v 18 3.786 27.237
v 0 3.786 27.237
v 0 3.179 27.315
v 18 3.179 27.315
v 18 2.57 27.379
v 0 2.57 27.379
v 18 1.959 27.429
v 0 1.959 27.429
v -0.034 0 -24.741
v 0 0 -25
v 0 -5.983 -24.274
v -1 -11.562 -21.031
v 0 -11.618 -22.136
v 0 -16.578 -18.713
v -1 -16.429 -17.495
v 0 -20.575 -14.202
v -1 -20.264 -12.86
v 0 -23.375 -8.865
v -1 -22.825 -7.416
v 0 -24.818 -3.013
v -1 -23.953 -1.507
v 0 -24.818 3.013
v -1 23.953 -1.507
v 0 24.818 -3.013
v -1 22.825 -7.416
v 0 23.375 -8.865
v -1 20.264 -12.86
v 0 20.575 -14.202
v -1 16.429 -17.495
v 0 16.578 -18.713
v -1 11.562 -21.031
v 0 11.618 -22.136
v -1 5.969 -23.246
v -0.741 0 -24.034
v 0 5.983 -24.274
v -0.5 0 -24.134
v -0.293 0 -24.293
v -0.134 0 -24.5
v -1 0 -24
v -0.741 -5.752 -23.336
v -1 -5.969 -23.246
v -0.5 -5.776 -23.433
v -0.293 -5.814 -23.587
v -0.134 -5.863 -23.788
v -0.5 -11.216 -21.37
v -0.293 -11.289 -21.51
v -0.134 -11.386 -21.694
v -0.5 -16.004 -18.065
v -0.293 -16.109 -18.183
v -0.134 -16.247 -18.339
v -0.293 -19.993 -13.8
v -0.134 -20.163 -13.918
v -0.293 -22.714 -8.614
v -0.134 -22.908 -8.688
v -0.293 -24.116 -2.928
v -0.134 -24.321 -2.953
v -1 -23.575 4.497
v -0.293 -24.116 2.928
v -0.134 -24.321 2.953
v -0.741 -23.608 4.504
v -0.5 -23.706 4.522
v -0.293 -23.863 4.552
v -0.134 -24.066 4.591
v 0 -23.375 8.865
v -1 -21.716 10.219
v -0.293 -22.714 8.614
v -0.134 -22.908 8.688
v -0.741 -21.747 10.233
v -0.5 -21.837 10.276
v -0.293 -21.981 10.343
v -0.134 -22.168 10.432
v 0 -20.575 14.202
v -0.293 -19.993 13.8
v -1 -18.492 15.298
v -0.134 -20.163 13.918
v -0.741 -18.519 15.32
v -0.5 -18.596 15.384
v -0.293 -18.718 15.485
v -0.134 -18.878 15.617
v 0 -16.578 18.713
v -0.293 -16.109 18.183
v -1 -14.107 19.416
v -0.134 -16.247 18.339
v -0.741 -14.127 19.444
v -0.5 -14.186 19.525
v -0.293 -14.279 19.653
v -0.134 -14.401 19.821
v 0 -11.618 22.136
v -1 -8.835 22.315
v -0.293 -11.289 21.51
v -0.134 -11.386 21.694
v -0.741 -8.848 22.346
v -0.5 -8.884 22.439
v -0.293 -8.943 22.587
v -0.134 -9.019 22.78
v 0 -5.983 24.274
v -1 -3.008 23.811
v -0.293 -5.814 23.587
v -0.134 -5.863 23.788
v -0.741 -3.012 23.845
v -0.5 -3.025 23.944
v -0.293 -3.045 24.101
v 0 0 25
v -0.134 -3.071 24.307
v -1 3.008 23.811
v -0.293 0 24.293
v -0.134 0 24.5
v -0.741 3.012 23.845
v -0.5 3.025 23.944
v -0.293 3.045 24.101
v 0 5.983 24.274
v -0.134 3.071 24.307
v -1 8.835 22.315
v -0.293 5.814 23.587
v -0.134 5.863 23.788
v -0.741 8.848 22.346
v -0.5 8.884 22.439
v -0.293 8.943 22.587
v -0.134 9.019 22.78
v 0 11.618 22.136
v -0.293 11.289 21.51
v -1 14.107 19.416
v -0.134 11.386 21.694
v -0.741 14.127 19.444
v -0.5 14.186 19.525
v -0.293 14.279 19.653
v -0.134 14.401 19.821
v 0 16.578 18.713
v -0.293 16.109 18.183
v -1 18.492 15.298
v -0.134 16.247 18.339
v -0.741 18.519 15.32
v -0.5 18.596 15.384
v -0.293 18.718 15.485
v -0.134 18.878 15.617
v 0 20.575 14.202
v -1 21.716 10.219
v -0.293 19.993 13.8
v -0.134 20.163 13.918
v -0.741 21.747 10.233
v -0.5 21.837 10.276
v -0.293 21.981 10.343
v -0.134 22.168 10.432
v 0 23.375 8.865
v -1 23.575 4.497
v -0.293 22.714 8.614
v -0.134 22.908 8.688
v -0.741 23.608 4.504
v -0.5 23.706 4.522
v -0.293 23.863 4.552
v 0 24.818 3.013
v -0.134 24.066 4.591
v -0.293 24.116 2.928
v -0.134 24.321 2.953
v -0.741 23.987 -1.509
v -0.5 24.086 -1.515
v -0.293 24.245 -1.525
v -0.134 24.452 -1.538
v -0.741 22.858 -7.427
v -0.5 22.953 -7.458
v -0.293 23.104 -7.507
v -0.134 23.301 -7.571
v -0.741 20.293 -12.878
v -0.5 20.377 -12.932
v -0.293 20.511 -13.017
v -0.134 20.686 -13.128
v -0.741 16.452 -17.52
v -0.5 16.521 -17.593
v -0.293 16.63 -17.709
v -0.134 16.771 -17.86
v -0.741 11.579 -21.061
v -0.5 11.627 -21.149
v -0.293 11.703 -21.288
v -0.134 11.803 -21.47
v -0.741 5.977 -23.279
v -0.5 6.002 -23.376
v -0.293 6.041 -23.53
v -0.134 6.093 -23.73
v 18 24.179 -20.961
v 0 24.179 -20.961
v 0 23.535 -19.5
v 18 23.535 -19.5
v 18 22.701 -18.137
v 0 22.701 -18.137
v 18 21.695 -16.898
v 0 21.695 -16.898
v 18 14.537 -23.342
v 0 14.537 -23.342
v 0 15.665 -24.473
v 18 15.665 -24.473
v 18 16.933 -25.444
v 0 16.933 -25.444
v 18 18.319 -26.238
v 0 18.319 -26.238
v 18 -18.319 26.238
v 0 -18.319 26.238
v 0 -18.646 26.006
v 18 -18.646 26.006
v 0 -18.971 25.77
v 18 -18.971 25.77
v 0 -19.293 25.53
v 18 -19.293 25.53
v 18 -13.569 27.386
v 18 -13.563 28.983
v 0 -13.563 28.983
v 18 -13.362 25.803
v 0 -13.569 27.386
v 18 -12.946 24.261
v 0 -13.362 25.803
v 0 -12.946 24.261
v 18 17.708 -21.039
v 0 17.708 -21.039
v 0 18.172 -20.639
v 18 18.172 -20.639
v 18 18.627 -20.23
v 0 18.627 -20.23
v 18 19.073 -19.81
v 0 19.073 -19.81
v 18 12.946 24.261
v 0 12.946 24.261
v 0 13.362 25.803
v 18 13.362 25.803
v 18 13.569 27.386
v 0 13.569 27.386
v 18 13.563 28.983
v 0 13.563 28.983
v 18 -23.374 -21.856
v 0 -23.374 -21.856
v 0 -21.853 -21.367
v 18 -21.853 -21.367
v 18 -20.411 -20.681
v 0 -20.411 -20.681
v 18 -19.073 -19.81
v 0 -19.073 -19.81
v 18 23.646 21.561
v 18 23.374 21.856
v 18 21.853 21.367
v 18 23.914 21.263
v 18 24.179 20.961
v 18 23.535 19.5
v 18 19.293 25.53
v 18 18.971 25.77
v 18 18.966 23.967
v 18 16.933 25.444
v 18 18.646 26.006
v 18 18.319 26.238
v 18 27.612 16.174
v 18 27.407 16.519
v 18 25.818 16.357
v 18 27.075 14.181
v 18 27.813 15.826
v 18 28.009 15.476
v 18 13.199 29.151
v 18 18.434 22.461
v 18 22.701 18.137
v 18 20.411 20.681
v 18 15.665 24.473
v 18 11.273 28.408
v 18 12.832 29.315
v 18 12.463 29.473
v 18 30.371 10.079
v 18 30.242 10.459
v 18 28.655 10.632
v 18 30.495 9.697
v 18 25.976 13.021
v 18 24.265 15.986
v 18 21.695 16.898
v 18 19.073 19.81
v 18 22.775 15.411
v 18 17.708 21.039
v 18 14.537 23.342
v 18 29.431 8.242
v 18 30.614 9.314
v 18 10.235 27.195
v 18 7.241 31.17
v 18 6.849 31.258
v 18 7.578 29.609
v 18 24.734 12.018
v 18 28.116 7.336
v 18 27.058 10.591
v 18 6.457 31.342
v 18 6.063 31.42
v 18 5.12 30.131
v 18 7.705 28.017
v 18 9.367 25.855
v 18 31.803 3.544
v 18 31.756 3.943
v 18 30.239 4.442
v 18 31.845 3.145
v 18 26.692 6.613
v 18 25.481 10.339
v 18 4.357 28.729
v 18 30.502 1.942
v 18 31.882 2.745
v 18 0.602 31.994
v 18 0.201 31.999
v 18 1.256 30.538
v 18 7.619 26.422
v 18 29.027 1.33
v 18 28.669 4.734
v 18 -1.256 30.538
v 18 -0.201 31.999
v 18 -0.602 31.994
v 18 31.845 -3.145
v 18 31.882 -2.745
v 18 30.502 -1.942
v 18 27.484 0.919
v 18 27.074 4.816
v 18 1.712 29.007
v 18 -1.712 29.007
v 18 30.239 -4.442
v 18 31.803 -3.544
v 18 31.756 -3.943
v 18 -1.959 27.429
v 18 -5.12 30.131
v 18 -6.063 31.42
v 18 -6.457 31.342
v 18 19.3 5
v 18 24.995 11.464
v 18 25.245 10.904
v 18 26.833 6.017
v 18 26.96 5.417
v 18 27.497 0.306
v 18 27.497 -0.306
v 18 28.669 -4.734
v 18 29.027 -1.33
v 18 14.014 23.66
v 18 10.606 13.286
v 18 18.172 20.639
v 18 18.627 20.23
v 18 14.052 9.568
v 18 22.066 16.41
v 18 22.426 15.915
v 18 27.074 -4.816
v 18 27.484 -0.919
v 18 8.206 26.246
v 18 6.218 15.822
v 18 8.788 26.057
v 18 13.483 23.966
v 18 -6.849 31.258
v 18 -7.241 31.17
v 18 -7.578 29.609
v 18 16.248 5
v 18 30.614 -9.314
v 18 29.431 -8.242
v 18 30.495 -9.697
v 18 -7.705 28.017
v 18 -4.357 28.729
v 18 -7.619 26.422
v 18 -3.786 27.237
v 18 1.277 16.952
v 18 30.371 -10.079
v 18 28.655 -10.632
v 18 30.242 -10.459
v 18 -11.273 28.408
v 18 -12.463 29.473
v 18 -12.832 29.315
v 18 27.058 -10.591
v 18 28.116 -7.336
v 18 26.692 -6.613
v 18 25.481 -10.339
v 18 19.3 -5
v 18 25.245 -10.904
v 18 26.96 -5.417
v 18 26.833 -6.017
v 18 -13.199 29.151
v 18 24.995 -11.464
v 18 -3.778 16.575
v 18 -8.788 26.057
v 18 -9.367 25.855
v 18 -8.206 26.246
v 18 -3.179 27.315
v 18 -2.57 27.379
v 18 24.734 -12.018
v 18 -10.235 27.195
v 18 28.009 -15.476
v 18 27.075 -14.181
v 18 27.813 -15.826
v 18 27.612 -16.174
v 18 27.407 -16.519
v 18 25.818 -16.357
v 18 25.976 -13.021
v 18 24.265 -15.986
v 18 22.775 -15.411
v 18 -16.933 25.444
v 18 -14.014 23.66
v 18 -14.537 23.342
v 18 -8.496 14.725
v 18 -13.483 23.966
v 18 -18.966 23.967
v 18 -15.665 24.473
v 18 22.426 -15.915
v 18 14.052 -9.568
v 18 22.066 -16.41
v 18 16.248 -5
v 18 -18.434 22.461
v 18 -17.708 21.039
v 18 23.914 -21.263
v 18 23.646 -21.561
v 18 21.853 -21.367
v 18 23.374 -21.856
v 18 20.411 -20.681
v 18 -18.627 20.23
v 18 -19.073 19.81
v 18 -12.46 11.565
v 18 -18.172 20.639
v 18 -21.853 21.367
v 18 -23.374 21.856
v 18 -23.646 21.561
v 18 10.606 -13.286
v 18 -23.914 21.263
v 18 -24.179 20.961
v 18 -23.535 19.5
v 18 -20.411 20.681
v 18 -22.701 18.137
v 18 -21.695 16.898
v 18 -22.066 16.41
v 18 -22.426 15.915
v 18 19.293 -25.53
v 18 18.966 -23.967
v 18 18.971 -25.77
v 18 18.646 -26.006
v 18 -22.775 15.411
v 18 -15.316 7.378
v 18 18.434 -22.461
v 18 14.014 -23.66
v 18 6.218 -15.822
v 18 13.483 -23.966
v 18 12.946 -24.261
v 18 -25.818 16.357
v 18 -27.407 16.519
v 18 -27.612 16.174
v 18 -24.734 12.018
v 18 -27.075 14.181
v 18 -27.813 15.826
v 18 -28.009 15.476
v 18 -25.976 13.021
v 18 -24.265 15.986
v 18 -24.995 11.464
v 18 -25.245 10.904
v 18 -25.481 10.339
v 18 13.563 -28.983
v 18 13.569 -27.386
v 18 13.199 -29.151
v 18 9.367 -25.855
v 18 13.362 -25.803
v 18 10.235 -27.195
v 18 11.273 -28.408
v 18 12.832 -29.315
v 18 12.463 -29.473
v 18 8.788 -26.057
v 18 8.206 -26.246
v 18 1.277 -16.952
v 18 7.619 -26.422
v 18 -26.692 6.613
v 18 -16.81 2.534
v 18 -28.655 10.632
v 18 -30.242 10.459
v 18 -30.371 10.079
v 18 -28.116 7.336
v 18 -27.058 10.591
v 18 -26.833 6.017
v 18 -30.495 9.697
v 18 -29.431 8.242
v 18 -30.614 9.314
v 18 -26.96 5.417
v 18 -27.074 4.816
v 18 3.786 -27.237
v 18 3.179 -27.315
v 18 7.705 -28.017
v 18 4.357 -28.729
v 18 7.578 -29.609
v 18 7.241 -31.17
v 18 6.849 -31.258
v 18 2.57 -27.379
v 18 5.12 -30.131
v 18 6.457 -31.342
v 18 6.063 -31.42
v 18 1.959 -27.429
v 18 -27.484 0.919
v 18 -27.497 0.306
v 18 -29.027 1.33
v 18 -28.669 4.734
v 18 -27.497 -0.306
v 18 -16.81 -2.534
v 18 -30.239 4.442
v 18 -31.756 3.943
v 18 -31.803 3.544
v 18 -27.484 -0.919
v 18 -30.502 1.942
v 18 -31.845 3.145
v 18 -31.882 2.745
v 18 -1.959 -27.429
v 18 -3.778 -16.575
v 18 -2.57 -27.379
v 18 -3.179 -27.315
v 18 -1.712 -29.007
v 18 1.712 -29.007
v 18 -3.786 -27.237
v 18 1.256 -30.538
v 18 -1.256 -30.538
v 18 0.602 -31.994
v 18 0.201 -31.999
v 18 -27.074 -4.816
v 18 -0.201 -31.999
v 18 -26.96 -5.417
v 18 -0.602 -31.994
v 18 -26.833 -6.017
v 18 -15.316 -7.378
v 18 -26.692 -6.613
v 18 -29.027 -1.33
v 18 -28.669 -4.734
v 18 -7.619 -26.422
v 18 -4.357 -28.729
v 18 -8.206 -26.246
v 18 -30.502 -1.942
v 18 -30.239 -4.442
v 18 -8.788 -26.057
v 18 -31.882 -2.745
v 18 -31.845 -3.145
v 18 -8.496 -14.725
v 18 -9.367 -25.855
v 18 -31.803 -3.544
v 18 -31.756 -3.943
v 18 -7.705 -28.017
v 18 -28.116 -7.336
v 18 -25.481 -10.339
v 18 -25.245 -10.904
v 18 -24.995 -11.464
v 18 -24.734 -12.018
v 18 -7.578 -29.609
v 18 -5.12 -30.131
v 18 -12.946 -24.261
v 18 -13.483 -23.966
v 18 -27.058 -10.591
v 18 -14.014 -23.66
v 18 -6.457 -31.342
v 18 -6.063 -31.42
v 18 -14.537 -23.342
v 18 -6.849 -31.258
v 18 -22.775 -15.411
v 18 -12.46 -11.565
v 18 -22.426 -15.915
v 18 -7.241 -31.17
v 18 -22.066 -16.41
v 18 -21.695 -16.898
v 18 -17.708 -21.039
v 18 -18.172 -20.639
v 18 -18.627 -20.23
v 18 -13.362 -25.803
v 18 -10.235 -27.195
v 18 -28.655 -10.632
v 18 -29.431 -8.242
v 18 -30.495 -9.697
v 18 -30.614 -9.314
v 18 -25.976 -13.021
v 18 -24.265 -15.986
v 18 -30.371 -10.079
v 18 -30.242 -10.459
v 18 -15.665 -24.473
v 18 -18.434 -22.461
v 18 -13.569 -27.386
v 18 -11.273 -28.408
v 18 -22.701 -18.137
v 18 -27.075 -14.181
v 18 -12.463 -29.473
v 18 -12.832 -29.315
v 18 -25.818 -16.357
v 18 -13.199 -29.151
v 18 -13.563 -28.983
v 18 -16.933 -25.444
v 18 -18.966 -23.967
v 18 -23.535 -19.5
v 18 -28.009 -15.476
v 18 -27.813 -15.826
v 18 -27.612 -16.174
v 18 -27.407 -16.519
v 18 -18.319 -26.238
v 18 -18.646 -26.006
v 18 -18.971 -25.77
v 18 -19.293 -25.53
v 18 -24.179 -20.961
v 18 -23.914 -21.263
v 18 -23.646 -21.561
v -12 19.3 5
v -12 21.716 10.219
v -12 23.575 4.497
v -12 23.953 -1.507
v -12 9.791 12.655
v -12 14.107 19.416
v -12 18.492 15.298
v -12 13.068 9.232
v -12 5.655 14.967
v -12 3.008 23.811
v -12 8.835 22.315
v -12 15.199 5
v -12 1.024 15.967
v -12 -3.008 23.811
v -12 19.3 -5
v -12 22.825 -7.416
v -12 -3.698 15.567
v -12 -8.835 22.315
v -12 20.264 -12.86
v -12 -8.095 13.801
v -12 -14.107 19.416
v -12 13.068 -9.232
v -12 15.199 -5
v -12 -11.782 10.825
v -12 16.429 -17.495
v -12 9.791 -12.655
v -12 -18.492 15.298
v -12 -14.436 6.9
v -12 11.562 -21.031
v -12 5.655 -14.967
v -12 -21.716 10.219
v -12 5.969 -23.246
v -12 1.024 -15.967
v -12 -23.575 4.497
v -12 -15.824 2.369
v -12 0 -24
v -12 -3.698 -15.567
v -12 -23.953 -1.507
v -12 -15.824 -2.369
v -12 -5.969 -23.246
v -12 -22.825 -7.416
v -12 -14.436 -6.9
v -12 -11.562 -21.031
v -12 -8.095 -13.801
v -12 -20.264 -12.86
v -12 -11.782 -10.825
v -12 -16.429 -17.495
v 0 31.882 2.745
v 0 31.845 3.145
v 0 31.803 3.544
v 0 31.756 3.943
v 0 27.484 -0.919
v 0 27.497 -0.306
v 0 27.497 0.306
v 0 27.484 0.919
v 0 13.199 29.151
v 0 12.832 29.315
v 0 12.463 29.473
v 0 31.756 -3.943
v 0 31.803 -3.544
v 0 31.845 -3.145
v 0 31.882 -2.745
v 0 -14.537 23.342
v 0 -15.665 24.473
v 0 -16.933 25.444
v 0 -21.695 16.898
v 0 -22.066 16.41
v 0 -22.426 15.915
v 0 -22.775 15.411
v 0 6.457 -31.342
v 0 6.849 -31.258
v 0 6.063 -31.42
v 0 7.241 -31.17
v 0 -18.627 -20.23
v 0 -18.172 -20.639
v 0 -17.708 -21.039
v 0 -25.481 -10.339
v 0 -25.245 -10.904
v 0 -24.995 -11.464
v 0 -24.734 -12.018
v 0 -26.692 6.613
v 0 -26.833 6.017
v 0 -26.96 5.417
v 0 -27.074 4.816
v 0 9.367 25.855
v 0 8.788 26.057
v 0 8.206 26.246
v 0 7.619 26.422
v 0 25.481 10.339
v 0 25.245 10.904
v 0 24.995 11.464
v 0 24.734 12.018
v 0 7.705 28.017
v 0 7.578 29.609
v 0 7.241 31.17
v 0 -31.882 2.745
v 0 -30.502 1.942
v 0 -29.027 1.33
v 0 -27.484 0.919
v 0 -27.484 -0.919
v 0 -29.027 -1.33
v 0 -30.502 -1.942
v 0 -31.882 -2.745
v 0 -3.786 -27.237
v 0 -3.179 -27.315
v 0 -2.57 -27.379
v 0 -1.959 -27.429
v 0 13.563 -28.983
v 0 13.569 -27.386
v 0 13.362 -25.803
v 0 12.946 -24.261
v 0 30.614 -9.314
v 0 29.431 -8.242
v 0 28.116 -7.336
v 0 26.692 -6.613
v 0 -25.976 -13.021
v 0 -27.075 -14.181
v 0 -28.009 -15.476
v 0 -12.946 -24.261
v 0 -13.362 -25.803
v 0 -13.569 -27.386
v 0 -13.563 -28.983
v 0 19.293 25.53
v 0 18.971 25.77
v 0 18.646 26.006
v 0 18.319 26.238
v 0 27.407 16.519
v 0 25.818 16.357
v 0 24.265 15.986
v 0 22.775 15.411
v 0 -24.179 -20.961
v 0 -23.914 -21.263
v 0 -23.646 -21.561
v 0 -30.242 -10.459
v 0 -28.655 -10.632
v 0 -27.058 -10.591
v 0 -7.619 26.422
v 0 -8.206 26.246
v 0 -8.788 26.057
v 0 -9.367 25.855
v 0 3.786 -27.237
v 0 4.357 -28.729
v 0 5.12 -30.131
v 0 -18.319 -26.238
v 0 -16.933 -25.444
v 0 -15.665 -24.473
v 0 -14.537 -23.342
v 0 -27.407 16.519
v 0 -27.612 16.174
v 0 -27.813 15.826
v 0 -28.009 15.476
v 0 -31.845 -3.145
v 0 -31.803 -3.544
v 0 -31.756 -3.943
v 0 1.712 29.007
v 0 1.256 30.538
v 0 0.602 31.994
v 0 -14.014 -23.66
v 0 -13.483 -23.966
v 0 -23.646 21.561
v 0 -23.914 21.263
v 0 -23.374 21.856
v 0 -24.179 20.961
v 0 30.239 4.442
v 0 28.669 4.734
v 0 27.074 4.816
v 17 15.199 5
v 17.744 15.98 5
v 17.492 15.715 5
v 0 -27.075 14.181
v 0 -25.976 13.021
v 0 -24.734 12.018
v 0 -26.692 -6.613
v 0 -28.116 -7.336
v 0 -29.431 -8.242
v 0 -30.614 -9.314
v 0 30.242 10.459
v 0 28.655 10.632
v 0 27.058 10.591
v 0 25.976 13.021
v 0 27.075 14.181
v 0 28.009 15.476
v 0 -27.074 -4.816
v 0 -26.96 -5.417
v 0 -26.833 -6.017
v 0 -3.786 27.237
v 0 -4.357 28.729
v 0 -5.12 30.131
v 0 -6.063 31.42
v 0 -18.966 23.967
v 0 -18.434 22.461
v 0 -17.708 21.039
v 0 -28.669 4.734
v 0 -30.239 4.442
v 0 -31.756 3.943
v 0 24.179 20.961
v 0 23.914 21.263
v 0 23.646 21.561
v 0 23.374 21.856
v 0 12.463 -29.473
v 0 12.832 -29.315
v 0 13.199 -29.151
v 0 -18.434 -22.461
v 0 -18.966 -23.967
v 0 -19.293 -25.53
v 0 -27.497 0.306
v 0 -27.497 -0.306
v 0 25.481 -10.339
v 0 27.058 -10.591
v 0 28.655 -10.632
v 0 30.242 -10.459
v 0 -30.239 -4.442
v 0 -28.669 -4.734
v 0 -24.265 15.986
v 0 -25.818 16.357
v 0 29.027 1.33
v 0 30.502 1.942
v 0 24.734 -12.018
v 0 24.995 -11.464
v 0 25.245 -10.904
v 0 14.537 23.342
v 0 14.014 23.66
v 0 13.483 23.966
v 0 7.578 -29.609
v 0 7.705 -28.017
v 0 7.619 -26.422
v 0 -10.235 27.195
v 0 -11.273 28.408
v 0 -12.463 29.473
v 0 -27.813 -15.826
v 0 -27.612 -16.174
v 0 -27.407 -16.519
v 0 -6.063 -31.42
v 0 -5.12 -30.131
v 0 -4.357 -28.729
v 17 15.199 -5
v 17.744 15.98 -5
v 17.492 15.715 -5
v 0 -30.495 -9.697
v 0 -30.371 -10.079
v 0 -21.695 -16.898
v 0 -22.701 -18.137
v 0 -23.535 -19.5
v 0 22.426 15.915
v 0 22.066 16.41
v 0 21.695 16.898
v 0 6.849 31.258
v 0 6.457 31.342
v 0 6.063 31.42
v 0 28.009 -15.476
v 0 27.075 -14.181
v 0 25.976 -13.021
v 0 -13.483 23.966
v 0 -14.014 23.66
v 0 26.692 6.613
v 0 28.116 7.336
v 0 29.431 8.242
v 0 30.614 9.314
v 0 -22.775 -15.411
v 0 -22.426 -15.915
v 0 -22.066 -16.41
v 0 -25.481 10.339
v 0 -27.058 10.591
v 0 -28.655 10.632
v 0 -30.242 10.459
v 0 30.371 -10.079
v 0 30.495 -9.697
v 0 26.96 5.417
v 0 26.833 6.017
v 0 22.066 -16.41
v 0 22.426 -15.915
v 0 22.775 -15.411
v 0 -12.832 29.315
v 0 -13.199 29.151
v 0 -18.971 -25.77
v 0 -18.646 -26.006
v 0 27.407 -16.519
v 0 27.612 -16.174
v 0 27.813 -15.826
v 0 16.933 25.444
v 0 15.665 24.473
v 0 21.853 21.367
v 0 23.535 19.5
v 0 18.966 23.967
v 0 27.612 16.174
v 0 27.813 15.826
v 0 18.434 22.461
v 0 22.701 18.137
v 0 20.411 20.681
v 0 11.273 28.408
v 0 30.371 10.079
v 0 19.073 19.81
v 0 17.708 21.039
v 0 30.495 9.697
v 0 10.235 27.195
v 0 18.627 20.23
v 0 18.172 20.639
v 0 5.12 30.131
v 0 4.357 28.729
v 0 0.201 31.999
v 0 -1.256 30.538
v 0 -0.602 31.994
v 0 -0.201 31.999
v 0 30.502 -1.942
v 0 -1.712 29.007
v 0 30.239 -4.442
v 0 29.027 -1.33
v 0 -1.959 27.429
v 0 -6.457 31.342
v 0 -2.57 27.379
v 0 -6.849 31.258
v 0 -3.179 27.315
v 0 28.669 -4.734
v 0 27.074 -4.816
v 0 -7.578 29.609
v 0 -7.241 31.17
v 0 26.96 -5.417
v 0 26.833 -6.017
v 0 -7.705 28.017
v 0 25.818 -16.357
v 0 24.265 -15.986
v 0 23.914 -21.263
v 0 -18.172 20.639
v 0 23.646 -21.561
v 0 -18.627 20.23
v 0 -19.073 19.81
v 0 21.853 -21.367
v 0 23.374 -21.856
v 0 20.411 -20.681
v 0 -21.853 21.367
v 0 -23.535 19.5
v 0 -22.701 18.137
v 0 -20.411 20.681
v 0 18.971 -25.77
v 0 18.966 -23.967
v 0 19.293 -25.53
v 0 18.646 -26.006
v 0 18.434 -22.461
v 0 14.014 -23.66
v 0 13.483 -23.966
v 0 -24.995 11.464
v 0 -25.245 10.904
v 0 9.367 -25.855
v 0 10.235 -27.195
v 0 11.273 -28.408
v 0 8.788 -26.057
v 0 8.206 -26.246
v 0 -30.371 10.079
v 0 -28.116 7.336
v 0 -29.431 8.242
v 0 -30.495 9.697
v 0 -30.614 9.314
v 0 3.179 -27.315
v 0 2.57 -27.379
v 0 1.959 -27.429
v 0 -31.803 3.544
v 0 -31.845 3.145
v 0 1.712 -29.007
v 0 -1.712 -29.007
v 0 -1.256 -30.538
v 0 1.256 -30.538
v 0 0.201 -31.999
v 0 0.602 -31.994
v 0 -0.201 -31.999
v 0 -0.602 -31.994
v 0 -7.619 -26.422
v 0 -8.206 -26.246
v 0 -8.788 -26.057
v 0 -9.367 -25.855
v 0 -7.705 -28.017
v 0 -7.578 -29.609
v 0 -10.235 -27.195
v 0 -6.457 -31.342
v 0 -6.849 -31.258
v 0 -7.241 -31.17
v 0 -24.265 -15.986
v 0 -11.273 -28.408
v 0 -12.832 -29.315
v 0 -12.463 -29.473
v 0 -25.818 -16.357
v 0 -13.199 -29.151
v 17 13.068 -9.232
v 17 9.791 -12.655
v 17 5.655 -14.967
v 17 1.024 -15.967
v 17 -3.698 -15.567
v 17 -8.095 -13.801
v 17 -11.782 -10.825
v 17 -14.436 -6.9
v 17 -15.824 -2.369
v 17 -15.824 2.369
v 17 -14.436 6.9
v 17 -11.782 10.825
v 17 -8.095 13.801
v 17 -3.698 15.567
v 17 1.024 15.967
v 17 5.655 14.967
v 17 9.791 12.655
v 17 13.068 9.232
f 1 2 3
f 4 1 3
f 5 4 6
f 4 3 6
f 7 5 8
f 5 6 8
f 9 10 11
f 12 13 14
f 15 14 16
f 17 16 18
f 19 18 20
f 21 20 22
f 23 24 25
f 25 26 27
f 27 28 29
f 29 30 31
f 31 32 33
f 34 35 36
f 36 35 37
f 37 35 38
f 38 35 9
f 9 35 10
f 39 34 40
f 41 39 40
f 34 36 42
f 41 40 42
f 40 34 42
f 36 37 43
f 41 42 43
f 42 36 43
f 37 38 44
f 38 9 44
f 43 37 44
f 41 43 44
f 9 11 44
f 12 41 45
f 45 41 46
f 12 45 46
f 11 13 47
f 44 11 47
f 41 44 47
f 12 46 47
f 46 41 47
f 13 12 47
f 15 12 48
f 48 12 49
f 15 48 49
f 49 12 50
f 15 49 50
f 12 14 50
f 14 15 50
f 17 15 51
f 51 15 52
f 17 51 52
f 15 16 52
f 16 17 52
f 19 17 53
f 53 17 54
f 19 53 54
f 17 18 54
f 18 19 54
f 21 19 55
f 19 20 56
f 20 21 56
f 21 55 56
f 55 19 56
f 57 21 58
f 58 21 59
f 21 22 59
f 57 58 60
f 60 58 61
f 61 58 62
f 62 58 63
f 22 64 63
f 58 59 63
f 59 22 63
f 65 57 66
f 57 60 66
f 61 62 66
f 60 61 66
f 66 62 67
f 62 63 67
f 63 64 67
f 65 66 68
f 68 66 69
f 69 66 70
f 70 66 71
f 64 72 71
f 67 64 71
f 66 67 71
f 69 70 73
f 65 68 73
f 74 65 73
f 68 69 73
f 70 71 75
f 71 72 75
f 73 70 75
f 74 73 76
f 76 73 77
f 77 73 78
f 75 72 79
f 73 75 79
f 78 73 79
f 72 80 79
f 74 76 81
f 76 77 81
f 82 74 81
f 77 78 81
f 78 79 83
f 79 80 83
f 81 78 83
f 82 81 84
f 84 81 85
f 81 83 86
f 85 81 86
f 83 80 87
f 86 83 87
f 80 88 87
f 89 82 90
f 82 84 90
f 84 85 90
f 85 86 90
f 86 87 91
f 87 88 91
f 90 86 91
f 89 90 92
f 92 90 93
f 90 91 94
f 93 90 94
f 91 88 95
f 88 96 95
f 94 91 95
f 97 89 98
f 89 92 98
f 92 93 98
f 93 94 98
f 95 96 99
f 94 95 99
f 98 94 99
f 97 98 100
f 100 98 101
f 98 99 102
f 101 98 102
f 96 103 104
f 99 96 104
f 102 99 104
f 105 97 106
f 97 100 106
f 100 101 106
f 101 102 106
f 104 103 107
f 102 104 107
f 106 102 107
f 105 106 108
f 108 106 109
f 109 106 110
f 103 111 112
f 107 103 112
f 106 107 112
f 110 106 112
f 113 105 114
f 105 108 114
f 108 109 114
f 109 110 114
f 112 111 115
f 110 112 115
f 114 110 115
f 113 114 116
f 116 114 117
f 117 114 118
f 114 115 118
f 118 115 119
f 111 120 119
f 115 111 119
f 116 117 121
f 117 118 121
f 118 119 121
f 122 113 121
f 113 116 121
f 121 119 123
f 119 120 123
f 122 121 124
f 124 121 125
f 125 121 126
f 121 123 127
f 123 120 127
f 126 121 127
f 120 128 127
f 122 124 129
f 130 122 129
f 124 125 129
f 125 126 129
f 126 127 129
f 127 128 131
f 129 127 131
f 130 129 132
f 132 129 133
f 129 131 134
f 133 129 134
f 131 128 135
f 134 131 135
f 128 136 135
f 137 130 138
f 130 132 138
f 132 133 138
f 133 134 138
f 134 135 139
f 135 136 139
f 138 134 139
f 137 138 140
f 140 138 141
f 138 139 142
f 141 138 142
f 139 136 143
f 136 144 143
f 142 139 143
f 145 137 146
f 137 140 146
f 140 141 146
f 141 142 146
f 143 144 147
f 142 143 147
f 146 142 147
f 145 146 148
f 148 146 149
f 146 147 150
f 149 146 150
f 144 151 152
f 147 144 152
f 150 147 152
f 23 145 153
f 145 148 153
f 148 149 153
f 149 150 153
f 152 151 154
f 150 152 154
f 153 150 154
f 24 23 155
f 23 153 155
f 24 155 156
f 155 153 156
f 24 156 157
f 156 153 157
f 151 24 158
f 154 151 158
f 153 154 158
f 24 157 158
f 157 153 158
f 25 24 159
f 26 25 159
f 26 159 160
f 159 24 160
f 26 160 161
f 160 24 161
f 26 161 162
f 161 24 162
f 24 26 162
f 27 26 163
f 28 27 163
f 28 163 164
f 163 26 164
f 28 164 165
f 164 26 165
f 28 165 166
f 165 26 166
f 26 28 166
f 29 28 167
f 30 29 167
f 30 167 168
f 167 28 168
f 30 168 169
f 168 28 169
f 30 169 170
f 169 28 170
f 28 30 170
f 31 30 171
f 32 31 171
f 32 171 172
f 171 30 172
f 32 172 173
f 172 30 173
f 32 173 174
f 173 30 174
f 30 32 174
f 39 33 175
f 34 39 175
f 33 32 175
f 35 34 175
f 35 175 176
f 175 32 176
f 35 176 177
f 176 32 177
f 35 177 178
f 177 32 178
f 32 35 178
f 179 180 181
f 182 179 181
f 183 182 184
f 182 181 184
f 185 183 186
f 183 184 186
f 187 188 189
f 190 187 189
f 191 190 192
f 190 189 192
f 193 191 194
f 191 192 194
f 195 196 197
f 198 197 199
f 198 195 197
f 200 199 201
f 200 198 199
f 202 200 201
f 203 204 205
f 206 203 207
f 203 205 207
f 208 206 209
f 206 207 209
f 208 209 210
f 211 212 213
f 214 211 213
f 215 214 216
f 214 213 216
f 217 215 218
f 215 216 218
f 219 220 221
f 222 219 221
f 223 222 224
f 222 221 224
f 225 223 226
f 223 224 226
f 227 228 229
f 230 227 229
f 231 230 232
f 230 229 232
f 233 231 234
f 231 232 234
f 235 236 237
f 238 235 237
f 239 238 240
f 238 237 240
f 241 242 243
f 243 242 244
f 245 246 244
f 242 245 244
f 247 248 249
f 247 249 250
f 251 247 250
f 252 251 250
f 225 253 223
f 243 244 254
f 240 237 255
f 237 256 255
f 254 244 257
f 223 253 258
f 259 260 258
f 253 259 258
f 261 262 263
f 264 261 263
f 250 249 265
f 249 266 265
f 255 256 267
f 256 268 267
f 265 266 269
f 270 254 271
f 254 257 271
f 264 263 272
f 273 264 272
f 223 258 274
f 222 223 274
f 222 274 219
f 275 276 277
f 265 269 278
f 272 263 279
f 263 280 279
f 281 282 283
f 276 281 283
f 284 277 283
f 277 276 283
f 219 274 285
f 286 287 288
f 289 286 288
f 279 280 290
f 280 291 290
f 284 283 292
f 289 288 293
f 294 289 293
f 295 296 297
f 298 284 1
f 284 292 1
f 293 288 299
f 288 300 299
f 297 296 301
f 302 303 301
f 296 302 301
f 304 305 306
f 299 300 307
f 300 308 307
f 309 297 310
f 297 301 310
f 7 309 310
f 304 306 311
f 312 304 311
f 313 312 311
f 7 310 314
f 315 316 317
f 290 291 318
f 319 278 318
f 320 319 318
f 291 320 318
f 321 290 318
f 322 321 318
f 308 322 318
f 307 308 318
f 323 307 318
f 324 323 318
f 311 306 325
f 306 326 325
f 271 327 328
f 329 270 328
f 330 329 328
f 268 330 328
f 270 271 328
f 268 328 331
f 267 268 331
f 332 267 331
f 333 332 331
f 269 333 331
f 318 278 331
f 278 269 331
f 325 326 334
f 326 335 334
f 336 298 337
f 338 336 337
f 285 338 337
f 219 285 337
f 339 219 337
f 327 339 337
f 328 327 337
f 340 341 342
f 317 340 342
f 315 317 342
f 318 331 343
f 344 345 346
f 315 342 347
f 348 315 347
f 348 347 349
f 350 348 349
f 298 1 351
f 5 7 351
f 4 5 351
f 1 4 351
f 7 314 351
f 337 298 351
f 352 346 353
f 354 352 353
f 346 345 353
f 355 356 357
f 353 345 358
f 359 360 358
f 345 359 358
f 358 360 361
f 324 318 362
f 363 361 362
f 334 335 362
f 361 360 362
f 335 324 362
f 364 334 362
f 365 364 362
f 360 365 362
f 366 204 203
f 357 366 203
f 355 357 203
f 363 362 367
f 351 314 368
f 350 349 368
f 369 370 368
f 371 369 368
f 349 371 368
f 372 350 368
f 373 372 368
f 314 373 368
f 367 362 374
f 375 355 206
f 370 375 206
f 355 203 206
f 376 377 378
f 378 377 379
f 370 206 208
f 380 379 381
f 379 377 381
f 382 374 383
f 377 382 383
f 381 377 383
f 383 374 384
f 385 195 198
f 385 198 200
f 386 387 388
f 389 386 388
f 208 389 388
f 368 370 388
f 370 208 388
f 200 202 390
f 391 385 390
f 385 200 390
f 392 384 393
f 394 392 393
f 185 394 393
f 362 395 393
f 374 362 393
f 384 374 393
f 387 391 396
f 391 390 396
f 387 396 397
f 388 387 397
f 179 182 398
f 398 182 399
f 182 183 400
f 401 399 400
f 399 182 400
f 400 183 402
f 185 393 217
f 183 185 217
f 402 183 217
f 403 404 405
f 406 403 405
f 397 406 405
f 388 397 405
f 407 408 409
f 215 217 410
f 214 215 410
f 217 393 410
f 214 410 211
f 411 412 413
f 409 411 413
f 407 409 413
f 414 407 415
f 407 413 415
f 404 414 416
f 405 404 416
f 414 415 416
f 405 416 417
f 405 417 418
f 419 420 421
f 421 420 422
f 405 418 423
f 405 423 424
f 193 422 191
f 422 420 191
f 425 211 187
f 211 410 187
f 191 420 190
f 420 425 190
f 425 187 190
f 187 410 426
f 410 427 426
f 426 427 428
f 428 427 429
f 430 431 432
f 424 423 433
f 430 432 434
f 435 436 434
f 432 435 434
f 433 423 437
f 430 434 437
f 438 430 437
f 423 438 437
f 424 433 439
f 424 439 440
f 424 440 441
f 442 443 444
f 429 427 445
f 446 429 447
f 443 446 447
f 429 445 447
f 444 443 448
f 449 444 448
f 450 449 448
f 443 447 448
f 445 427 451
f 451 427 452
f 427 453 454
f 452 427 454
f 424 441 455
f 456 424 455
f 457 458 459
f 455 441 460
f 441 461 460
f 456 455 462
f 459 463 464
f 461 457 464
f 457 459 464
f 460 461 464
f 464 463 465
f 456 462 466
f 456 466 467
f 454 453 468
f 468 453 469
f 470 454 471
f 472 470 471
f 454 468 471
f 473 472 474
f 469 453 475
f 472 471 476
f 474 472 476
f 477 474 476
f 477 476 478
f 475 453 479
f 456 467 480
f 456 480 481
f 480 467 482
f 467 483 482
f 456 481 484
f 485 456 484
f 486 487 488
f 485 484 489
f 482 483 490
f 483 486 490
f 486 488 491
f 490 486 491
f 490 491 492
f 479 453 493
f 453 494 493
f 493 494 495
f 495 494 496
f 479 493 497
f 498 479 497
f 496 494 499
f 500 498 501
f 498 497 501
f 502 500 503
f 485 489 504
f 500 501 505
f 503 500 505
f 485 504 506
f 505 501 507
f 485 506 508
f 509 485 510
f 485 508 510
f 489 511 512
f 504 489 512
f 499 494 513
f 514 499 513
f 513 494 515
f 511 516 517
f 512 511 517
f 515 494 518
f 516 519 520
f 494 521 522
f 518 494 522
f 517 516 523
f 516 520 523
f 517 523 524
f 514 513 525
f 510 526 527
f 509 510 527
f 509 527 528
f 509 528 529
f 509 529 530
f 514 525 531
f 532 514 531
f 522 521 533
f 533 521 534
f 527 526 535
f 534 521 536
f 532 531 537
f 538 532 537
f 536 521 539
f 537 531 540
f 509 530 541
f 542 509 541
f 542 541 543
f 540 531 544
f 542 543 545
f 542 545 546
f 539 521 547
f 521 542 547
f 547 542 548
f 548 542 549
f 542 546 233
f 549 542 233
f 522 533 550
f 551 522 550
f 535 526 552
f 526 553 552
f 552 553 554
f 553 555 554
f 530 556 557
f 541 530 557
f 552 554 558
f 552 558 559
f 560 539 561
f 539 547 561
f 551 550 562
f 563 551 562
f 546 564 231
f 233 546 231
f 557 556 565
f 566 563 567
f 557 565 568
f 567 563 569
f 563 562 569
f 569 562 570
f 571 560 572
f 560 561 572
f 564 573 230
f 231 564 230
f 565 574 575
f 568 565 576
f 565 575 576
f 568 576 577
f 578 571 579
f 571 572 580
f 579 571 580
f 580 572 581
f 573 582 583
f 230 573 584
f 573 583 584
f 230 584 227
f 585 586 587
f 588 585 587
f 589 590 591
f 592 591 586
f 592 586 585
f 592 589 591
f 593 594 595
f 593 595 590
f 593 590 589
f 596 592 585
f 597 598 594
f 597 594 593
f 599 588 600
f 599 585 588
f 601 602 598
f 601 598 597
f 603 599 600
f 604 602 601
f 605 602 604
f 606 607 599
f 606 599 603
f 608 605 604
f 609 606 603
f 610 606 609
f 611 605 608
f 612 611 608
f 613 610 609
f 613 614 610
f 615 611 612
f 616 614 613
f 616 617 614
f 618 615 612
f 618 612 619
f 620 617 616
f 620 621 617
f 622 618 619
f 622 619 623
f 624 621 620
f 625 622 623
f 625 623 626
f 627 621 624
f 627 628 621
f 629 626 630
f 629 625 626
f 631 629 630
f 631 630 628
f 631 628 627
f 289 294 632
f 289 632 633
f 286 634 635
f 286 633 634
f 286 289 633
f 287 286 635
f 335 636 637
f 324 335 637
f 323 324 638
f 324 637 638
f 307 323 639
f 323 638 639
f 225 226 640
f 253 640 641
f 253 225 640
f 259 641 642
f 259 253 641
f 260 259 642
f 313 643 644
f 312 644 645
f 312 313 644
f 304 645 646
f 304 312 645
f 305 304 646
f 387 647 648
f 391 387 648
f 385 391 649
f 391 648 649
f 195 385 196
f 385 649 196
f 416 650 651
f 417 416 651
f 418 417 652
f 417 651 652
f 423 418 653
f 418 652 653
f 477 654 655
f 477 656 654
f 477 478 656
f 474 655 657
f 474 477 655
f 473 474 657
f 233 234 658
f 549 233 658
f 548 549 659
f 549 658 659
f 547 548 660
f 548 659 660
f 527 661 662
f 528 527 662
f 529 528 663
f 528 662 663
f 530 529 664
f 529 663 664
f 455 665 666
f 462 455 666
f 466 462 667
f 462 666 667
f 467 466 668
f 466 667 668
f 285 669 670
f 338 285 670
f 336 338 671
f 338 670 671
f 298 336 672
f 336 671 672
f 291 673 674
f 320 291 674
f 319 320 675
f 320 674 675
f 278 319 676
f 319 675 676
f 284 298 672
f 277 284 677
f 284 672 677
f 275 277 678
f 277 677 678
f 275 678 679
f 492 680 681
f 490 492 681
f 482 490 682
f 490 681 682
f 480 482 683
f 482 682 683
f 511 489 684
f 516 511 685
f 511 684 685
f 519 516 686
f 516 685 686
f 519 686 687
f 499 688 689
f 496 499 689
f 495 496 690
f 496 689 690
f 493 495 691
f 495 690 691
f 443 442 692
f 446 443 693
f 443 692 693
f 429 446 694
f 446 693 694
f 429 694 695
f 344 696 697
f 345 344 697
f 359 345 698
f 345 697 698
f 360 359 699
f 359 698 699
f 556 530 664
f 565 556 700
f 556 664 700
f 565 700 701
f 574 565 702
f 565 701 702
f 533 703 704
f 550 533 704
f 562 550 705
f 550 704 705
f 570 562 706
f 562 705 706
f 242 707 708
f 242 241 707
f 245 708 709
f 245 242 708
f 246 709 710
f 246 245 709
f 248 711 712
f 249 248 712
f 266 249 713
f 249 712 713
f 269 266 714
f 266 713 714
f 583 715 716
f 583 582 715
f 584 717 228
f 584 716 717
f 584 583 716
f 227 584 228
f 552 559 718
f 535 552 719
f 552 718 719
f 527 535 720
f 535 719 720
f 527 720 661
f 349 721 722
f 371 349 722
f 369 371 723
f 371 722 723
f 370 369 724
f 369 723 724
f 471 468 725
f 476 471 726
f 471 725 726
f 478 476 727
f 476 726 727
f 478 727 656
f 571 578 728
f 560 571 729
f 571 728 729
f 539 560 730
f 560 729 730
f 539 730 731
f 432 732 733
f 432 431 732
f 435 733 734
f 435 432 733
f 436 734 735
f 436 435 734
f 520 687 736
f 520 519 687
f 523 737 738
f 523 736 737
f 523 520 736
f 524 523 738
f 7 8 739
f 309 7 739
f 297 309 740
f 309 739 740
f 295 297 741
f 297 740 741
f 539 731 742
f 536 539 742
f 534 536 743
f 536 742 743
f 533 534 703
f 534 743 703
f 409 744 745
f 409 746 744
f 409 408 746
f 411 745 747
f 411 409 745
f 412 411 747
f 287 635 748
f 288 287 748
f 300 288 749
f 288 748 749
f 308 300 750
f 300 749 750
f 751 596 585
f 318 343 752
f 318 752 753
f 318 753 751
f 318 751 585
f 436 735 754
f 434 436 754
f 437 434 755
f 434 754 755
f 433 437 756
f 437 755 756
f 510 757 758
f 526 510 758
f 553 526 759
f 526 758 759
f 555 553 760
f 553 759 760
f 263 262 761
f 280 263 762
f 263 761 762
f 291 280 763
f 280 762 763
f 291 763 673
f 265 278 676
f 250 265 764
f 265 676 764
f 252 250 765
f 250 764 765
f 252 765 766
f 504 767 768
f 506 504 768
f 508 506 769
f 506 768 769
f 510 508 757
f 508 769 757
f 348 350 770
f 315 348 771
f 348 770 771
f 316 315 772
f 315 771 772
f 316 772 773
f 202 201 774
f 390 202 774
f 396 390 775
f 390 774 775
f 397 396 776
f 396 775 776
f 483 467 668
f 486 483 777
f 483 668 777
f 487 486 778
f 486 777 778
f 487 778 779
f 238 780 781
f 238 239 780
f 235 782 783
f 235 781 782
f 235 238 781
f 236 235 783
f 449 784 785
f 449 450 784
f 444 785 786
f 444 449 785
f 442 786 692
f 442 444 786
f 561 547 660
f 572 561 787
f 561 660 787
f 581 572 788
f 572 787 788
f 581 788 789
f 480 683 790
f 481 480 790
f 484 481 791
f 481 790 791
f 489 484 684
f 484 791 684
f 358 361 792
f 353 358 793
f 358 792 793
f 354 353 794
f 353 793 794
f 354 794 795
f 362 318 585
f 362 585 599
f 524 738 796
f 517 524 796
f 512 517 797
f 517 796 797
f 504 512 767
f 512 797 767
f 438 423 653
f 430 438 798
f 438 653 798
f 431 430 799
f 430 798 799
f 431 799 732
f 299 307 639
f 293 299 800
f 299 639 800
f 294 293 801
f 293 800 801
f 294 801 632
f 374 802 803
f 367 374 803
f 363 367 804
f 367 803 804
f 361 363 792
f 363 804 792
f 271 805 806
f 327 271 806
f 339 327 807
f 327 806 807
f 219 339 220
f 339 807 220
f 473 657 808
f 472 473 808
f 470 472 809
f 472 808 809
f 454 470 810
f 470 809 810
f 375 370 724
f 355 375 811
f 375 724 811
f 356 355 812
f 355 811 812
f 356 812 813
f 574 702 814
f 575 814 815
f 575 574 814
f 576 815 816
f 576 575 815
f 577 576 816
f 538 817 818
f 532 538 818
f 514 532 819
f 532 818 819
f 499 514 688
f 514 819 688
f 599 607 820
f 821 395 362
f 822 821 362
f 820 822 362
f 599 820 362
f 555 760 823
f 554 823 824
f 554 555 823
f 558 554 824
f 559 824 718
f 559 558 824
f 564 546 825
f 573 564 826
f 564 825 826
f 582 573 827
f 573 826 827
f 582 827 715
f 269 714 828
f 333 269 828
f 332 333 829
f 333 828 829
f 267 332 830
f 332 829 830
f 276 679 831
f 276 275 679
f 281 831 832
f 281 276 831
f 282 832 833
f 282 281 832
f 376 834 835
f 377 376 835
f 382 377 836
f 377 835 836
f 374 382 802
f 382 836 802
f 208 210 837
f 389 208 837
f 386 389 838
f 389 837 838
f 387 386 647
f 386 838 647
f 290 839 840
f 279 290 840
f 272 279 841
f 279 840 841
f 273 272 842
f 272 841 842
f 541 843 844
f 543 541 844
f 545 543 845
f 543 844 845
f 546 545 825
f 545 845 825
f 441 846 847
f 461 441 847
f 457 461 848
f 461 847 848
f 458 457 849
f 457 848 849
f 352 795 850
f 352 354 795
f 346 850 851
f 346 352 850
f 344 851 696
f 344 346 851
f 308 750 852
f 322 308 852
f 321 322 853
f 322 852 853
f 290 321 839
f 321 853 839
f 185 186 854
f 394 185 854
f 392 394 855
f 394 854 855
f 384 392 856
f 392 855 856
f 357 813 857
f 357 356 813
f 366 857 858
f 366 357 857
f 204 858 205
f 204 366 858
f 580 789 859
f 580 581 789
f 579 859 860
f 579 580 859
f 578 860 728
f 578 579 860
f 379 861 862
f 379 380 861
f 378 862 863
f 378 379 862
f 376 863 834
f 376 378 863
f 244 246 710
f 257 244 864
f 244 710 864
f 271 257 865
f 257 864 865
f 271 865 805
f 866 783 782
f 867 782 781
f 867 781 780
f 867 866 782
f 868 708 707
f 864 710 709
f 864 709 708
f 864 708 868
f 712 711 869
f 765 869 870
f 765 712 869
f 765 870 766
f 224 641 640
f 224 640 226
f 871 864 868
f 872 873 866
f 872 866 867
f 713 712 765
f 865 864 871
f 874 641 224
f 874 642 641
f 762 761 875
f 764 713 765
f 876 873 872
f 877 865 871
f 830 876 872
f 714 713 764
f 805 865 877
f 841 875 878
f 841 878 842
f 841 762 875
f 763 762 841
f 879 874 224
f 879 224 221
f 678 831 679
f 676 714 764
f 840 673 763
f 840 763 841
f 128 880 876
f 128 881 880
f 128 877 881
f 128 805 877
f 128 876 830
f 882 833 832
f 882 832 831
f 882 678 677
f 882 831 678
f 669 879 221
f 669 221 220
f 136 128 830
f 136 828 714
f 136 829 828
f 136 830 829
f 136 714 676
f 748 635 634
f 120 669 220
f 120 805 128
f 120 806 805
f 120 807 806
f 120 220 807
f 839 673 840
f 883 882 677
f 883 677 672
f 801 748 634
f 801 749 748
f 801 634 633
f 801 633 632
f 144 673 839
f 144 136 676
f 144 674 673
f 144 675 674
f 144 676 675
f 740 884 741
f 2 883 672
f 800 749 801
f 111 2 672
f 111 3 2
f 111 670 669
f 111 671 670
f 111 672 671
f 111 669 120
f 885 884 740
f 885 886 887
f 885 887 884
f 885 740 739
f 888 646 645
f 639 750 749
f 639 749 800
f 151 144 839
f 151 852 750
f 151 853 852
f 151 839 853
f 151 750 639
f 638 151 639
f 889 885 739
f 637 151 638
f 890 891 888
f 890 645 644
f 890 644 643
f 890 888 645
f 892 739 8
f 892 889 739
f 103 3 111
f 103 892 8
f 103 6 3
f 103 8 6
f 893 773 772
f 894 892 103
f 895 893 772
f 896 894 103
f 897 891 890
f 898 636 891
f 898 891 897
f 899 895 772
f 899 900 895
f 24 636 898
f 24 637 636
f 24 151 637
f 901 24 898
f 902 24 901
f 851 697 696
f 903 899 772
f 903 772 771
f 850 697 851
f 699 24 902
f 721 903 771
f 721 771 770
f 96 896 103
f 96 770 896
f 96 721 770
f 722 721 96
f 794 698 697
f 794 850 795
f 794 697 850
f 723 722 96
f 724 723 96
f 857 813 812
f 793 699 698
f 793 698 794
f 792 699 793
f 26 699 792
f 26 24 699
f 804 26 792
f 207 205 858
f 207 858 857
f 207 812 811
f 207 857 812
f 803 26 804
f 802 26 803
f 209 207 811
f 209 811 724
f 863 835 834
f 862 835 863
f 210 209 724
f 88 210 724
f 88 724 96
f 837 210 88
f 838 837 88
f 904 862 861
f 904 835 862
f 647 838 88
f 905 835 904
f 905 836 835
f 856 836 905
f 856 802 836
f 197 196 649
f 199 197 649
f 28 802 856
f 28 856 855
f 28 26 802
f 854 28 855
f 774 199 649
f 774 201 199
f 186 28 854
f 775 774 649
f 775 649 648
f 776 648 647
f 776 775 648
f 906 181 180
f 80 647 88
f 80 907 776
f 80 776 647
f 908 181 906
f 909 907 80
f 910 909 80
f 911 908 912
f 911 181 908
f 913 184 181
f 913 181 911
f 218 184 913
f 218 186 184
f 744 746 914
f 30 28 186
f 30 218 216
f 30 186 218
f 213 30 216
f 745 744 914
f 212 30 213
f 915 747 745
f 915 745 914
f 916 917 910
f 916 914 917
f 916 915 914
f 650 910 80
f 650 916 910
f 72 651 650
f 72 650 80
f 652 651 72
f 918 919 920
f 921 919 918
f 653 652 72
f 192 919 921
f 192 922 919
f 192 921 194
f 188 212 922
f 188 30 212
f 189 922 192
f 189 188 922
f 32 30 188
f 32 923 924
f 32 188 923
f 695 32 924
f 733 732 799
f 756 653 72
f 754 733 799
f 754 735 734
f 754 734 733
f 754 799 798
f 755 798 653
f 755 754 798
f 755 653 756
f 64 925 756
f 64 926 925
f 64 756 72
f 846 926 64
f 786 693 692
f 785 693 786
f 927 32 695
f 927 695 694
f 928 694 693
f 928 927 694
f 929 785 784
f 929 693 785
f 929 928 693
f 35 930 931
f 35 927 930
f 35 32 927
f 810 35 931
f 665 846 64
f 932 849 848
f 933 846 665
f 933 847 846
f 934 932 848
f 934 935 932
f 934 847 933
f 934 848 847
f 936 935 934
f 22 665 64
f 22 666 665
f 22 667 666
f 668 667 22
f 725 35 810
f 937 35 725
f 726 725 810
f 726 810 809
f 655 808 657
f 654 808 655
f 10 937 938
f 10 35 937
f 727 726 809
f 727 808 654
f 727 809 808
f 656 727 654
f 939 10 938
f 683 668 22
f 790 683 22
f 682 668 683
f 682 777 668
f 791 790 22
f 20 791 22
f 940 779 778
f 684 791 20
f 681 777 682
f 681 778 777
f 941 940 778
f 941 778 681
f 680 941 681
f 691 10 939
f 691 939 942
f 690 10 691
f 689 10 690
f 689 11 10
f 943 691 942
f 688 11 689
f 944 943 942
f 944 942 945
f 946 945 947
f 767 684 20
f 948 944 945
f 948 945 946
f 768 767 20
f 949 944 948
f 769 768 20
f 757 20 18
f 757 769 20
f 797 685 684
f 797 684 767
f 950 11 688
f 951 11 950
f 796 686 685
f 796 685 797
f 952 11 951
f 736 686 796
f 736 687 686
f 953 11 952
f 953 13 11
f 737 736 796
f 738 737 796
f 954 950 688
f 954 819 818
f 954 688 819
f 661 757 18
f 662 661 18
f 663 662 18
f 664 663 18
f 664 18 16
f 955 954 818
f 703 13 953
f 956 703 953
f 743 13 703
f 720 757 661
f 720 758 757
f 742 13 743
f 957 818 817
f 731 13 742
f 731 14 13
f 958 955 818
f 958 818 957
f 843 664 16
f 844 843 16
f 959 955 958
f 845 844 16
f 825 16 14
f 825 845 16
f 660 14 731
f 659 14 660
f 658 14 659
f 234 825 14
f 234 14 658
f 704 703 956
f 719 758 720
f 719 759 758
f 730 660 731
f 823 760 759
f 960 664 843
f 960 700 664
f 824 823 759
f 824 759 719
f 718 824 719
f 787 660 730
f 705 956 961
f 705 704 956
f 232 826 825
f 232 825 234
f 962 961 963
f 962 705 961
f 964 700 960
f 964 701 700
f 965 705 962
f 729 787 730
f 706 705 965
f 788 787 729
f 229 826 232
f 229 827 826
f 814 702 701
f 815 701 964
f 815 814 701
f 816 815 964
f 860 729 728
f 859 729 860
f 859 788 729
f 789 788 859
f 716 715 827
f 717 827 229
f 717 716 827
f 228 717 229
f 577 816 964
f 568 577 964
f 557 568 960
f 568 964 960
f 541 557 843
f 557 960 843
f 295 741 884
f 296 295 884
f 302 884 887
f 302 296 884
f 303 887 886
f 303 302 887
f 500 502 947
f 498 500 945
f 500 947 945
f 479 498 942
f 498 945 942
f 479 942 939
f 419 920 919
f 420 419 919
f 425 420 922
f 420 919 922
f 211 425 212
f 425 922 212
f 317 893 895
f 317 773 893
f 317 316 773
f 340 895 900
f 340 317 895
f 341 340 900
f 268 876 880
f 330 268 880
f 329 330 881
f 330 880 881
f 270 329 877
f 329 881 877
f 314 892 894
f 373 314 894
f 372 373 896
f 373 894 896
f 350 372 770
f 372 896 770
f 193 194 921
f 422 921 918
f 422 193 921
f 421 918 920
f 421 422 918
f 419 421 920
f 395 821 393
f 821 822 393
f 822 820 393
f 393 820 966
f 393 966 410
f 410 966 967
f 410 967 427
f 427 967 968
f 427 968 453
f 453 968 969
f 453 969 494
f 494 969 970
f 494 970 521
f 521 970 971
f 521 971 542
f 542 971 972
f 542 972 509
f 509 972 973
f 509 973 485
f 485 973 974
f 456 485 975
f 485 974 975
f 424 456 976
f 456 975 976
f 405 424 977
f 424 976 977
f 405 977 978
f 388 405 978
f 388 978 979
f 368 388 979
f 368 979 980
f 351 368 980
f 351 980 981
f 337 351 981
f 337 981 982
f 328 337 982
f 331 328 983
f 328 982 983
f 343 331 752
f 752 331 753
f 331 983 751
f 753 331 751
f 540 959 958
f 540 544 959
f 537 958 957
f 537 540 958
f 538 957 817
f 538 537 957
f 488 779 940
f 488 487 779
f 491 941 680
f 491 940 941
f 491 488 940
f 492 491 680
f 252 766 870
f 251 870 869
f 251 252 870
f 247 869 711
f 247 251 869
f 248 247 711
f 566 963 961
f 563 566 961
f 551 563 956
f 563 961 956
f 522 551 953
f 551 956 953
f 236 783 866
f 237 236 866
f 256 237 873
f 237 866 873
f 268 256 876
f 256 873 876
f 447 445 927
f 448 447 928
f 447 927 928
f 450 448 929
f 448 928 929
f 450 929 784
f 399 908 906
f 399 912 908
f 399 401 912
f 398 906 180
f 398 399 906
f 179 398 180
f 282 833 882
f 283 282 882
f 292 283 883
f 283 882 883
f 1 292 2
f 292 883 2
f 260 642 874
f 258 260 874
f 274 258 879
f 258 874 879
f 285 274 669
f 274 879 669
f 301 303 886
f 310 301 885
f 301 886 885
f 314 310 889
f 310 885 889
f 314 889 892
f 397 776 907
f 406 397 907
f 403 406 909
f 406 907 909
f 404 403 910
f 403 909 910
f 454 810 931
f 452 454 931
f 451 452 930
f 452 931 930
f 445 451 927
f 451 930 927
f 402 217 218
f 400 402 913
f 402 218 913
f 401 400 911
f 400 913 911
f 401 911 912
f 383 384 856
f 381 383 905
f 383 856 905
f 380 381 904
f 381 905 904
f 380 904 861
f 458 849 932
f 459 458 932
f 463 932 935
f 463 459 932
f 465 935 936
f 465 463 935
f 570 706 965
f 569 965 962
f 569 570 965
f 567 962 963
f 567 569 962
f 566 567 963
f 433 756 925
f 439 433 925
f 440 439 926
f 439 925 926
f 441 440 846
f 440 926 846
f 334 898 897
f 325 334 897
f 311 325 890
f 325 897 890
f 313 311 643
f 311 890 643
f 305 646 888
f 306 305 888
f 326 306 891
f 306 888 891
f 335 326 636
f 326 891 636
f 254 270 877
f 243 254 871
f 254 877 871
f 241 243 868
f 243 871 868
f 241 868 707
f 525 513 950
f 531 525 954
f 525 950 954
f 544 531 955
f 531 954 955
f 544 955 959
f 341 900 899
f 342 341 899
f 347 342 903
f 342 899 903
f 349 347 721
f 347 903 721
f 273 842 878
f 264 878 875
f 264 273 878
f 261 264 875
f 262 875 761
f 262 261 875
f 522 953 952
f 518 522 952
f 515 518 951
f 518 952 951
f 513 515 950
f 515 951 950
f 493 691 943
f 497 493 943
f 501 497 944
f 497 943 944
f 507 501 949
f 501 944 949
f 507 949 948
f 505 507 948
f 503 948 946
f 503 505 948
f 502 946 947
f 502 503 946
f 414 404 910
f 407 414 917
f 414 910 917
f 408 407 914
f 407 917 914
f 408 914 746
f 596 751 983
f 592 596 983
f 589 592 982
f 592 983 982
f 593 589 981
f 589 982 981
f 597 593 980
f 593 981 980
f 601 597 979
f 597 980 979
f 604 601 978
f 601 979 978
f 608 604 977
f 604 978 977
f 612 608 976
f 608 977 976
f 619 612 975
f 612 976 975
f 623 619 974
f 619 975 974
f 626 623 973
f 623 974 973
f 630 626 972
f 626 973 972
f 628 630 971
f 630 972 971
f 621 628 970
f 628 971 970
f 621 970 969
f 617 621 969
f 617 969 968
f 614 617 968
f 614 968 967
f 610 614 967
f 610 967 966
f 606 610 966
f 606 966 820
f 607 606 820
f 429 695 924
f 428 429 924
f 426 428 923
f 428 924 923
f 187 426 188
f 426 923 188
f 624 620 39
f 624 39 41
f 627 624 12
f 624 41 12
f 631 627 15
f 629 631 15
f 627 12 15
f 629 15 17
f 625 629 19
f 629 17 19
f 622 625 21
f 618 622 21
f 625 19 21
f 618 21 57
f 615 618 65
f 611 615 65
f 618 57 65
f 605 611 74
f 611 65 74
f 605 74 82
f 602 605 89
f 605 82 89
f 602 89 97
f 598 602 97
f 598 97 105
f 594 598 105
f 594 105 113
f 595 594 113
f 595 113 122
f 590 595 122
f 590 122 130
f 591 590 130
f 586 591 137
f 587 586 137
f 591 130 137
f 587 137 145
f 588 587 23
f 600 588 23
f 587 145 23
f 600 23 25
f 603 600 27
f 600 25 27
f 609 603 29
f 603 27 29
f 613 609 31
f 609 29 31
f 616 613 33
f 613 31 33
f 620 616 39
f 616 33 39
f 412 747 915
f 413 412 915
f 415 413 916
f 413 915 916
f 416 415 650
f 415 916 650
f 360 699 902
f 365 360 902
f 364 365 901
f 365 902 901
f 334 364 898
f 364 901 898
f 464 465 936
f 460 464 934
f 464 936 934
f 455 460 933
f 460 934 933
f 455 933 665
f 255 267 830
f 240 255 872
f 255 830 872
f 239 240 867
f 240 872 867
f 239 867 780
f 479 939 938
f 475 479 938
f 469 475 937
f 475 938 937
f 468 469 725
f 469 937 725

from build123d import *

# Parameters (mm, degrees)
BASPROSKE_W      = 18
BASPROSKE_H      = 32
TOOTHCUT_DEPTH   = 49.703182648
TEETHCUTS_COUNT  = 30
HUBNEAONESKE_R   = 24
HUBNEARONE_DEPTH = 12.0000508
BORSKE_R         = 16
BORE_DEPTH       = 30.0000508
KEYSKE_W         = 10
KEYSKE_H         = 19.3
KEYWAY_DEPTH     = 30.0000508
SMUSSO1_SIZE     = 1
RACCORDO1_R      = 1


with BuildPart() as part:
    # BasProSke → Base-Revolve (revolve)
    with BuildSketch(Plane(origin=(0, 0, 0), x_dir=(1, 0, 0), z_dir=(0, 1, 0)), mode=Mode.PRIVATE) as base_revolve_sk:
        with Locations((9, 16)):
            Rectangle(BASPROSKE_W, BASPROSKE_H)
    revolve(base_revolve_sk.sketch.rotate(Axis((-10, 0, 0), (1, 0, 0)), 180), axis=Axis((-10, 0, 0), (1, 0, 0)))

    # TooCutSke → ToothCut (cut, through all)
    with BuildSketch(Plane(origin=(0, 0, 0), x_dir=(0, 0, -1), z_dir=(1, 0, 0))):
        with BuildLine():
            ThreePointArc((0.918551563, 27.483654488), (0, 27.499), (-0.918551563, 27.483654488))
            ThreePointArc((-0.918551563, 27.483654488), (-1.617208176, 29.787801627), (-2.761784709, 31.906093311))
            ThreePointArc((-2.761784709, 31.906093311), (0, 32.0254), (2.761784709, 31.906093311))
            ThreePointArc((2.761784709, 31.906093311), (1.617208176, 29.787801627), (0.918551563, 27.483654488))
        make_face()
    toothcut = extrude(amount=TOOTHCUT_DEPTH, mode=Mode.SUBTRACT)

    # TeethCuts: ToothCut ×30 about axis
    teethcuts_axis = Axis((0, 0, 0), (1, 0, 0))
    for i in range(1, TEETHCUTS_COUNT):
        add(toothcut.rotate(teethcuts_axis, i * 360 / TEETHCUTS_COUNT), mode=Mode.SUBTRACT)

    # HubNeaOneSke → HubNearOne (add)
    with BuildSketch(Plane.ZY):
        with Locations(Location((0, 0, 0), (0, 0, 180))):
            Circle(HUBNEAONESKE_R)
    extrude(amount=HUBNEARONE_DEPTH)

    # BorSke → Bore (cut, symmetric)
    with BuildSketch(Plane(origin=(0, 0, 0), x_dir=(0, 0, -1), z_dir=(1, 0, 0))):
        with Locations(Location((0, 0, 0), (0, 0, 180))):
            Circle(BORSKE_R)
    extrude(amount=BORE_DEPTH, both=True, mode=Mode.SUBTRACT)

    # KeySke → Keyway (cut, symmetric)
    with BuildSketch(Plane(origin=(0, 0, 0), x_dir=(0, 0, -1), z_dir=(1, 0, 0))):
        with Locations((0, 9.65)):
            Rectangle(KEYSKE_W, KEYSKE_H)
    extrude(amount=KEYWAY_DEPTH, both=True, mode=Mode.SUBTRACT)

    # Smusso1
    smusso1_edges = [part.edges().sort_by_distance(p)[0] for p in [
        (18, -16, 0),
    ]]
    chamfer(smusso1_edges, length=SMUSSO1_SIZE)

    # Raccordo1
    raccordo1_edges = [part.edges().sort_by_distance(p)[0] for p in [
        (0, 0, 24),
    ]]
    fillet(raccordo1_edges, radius=RACCORDO1_R)


solid = part.part
